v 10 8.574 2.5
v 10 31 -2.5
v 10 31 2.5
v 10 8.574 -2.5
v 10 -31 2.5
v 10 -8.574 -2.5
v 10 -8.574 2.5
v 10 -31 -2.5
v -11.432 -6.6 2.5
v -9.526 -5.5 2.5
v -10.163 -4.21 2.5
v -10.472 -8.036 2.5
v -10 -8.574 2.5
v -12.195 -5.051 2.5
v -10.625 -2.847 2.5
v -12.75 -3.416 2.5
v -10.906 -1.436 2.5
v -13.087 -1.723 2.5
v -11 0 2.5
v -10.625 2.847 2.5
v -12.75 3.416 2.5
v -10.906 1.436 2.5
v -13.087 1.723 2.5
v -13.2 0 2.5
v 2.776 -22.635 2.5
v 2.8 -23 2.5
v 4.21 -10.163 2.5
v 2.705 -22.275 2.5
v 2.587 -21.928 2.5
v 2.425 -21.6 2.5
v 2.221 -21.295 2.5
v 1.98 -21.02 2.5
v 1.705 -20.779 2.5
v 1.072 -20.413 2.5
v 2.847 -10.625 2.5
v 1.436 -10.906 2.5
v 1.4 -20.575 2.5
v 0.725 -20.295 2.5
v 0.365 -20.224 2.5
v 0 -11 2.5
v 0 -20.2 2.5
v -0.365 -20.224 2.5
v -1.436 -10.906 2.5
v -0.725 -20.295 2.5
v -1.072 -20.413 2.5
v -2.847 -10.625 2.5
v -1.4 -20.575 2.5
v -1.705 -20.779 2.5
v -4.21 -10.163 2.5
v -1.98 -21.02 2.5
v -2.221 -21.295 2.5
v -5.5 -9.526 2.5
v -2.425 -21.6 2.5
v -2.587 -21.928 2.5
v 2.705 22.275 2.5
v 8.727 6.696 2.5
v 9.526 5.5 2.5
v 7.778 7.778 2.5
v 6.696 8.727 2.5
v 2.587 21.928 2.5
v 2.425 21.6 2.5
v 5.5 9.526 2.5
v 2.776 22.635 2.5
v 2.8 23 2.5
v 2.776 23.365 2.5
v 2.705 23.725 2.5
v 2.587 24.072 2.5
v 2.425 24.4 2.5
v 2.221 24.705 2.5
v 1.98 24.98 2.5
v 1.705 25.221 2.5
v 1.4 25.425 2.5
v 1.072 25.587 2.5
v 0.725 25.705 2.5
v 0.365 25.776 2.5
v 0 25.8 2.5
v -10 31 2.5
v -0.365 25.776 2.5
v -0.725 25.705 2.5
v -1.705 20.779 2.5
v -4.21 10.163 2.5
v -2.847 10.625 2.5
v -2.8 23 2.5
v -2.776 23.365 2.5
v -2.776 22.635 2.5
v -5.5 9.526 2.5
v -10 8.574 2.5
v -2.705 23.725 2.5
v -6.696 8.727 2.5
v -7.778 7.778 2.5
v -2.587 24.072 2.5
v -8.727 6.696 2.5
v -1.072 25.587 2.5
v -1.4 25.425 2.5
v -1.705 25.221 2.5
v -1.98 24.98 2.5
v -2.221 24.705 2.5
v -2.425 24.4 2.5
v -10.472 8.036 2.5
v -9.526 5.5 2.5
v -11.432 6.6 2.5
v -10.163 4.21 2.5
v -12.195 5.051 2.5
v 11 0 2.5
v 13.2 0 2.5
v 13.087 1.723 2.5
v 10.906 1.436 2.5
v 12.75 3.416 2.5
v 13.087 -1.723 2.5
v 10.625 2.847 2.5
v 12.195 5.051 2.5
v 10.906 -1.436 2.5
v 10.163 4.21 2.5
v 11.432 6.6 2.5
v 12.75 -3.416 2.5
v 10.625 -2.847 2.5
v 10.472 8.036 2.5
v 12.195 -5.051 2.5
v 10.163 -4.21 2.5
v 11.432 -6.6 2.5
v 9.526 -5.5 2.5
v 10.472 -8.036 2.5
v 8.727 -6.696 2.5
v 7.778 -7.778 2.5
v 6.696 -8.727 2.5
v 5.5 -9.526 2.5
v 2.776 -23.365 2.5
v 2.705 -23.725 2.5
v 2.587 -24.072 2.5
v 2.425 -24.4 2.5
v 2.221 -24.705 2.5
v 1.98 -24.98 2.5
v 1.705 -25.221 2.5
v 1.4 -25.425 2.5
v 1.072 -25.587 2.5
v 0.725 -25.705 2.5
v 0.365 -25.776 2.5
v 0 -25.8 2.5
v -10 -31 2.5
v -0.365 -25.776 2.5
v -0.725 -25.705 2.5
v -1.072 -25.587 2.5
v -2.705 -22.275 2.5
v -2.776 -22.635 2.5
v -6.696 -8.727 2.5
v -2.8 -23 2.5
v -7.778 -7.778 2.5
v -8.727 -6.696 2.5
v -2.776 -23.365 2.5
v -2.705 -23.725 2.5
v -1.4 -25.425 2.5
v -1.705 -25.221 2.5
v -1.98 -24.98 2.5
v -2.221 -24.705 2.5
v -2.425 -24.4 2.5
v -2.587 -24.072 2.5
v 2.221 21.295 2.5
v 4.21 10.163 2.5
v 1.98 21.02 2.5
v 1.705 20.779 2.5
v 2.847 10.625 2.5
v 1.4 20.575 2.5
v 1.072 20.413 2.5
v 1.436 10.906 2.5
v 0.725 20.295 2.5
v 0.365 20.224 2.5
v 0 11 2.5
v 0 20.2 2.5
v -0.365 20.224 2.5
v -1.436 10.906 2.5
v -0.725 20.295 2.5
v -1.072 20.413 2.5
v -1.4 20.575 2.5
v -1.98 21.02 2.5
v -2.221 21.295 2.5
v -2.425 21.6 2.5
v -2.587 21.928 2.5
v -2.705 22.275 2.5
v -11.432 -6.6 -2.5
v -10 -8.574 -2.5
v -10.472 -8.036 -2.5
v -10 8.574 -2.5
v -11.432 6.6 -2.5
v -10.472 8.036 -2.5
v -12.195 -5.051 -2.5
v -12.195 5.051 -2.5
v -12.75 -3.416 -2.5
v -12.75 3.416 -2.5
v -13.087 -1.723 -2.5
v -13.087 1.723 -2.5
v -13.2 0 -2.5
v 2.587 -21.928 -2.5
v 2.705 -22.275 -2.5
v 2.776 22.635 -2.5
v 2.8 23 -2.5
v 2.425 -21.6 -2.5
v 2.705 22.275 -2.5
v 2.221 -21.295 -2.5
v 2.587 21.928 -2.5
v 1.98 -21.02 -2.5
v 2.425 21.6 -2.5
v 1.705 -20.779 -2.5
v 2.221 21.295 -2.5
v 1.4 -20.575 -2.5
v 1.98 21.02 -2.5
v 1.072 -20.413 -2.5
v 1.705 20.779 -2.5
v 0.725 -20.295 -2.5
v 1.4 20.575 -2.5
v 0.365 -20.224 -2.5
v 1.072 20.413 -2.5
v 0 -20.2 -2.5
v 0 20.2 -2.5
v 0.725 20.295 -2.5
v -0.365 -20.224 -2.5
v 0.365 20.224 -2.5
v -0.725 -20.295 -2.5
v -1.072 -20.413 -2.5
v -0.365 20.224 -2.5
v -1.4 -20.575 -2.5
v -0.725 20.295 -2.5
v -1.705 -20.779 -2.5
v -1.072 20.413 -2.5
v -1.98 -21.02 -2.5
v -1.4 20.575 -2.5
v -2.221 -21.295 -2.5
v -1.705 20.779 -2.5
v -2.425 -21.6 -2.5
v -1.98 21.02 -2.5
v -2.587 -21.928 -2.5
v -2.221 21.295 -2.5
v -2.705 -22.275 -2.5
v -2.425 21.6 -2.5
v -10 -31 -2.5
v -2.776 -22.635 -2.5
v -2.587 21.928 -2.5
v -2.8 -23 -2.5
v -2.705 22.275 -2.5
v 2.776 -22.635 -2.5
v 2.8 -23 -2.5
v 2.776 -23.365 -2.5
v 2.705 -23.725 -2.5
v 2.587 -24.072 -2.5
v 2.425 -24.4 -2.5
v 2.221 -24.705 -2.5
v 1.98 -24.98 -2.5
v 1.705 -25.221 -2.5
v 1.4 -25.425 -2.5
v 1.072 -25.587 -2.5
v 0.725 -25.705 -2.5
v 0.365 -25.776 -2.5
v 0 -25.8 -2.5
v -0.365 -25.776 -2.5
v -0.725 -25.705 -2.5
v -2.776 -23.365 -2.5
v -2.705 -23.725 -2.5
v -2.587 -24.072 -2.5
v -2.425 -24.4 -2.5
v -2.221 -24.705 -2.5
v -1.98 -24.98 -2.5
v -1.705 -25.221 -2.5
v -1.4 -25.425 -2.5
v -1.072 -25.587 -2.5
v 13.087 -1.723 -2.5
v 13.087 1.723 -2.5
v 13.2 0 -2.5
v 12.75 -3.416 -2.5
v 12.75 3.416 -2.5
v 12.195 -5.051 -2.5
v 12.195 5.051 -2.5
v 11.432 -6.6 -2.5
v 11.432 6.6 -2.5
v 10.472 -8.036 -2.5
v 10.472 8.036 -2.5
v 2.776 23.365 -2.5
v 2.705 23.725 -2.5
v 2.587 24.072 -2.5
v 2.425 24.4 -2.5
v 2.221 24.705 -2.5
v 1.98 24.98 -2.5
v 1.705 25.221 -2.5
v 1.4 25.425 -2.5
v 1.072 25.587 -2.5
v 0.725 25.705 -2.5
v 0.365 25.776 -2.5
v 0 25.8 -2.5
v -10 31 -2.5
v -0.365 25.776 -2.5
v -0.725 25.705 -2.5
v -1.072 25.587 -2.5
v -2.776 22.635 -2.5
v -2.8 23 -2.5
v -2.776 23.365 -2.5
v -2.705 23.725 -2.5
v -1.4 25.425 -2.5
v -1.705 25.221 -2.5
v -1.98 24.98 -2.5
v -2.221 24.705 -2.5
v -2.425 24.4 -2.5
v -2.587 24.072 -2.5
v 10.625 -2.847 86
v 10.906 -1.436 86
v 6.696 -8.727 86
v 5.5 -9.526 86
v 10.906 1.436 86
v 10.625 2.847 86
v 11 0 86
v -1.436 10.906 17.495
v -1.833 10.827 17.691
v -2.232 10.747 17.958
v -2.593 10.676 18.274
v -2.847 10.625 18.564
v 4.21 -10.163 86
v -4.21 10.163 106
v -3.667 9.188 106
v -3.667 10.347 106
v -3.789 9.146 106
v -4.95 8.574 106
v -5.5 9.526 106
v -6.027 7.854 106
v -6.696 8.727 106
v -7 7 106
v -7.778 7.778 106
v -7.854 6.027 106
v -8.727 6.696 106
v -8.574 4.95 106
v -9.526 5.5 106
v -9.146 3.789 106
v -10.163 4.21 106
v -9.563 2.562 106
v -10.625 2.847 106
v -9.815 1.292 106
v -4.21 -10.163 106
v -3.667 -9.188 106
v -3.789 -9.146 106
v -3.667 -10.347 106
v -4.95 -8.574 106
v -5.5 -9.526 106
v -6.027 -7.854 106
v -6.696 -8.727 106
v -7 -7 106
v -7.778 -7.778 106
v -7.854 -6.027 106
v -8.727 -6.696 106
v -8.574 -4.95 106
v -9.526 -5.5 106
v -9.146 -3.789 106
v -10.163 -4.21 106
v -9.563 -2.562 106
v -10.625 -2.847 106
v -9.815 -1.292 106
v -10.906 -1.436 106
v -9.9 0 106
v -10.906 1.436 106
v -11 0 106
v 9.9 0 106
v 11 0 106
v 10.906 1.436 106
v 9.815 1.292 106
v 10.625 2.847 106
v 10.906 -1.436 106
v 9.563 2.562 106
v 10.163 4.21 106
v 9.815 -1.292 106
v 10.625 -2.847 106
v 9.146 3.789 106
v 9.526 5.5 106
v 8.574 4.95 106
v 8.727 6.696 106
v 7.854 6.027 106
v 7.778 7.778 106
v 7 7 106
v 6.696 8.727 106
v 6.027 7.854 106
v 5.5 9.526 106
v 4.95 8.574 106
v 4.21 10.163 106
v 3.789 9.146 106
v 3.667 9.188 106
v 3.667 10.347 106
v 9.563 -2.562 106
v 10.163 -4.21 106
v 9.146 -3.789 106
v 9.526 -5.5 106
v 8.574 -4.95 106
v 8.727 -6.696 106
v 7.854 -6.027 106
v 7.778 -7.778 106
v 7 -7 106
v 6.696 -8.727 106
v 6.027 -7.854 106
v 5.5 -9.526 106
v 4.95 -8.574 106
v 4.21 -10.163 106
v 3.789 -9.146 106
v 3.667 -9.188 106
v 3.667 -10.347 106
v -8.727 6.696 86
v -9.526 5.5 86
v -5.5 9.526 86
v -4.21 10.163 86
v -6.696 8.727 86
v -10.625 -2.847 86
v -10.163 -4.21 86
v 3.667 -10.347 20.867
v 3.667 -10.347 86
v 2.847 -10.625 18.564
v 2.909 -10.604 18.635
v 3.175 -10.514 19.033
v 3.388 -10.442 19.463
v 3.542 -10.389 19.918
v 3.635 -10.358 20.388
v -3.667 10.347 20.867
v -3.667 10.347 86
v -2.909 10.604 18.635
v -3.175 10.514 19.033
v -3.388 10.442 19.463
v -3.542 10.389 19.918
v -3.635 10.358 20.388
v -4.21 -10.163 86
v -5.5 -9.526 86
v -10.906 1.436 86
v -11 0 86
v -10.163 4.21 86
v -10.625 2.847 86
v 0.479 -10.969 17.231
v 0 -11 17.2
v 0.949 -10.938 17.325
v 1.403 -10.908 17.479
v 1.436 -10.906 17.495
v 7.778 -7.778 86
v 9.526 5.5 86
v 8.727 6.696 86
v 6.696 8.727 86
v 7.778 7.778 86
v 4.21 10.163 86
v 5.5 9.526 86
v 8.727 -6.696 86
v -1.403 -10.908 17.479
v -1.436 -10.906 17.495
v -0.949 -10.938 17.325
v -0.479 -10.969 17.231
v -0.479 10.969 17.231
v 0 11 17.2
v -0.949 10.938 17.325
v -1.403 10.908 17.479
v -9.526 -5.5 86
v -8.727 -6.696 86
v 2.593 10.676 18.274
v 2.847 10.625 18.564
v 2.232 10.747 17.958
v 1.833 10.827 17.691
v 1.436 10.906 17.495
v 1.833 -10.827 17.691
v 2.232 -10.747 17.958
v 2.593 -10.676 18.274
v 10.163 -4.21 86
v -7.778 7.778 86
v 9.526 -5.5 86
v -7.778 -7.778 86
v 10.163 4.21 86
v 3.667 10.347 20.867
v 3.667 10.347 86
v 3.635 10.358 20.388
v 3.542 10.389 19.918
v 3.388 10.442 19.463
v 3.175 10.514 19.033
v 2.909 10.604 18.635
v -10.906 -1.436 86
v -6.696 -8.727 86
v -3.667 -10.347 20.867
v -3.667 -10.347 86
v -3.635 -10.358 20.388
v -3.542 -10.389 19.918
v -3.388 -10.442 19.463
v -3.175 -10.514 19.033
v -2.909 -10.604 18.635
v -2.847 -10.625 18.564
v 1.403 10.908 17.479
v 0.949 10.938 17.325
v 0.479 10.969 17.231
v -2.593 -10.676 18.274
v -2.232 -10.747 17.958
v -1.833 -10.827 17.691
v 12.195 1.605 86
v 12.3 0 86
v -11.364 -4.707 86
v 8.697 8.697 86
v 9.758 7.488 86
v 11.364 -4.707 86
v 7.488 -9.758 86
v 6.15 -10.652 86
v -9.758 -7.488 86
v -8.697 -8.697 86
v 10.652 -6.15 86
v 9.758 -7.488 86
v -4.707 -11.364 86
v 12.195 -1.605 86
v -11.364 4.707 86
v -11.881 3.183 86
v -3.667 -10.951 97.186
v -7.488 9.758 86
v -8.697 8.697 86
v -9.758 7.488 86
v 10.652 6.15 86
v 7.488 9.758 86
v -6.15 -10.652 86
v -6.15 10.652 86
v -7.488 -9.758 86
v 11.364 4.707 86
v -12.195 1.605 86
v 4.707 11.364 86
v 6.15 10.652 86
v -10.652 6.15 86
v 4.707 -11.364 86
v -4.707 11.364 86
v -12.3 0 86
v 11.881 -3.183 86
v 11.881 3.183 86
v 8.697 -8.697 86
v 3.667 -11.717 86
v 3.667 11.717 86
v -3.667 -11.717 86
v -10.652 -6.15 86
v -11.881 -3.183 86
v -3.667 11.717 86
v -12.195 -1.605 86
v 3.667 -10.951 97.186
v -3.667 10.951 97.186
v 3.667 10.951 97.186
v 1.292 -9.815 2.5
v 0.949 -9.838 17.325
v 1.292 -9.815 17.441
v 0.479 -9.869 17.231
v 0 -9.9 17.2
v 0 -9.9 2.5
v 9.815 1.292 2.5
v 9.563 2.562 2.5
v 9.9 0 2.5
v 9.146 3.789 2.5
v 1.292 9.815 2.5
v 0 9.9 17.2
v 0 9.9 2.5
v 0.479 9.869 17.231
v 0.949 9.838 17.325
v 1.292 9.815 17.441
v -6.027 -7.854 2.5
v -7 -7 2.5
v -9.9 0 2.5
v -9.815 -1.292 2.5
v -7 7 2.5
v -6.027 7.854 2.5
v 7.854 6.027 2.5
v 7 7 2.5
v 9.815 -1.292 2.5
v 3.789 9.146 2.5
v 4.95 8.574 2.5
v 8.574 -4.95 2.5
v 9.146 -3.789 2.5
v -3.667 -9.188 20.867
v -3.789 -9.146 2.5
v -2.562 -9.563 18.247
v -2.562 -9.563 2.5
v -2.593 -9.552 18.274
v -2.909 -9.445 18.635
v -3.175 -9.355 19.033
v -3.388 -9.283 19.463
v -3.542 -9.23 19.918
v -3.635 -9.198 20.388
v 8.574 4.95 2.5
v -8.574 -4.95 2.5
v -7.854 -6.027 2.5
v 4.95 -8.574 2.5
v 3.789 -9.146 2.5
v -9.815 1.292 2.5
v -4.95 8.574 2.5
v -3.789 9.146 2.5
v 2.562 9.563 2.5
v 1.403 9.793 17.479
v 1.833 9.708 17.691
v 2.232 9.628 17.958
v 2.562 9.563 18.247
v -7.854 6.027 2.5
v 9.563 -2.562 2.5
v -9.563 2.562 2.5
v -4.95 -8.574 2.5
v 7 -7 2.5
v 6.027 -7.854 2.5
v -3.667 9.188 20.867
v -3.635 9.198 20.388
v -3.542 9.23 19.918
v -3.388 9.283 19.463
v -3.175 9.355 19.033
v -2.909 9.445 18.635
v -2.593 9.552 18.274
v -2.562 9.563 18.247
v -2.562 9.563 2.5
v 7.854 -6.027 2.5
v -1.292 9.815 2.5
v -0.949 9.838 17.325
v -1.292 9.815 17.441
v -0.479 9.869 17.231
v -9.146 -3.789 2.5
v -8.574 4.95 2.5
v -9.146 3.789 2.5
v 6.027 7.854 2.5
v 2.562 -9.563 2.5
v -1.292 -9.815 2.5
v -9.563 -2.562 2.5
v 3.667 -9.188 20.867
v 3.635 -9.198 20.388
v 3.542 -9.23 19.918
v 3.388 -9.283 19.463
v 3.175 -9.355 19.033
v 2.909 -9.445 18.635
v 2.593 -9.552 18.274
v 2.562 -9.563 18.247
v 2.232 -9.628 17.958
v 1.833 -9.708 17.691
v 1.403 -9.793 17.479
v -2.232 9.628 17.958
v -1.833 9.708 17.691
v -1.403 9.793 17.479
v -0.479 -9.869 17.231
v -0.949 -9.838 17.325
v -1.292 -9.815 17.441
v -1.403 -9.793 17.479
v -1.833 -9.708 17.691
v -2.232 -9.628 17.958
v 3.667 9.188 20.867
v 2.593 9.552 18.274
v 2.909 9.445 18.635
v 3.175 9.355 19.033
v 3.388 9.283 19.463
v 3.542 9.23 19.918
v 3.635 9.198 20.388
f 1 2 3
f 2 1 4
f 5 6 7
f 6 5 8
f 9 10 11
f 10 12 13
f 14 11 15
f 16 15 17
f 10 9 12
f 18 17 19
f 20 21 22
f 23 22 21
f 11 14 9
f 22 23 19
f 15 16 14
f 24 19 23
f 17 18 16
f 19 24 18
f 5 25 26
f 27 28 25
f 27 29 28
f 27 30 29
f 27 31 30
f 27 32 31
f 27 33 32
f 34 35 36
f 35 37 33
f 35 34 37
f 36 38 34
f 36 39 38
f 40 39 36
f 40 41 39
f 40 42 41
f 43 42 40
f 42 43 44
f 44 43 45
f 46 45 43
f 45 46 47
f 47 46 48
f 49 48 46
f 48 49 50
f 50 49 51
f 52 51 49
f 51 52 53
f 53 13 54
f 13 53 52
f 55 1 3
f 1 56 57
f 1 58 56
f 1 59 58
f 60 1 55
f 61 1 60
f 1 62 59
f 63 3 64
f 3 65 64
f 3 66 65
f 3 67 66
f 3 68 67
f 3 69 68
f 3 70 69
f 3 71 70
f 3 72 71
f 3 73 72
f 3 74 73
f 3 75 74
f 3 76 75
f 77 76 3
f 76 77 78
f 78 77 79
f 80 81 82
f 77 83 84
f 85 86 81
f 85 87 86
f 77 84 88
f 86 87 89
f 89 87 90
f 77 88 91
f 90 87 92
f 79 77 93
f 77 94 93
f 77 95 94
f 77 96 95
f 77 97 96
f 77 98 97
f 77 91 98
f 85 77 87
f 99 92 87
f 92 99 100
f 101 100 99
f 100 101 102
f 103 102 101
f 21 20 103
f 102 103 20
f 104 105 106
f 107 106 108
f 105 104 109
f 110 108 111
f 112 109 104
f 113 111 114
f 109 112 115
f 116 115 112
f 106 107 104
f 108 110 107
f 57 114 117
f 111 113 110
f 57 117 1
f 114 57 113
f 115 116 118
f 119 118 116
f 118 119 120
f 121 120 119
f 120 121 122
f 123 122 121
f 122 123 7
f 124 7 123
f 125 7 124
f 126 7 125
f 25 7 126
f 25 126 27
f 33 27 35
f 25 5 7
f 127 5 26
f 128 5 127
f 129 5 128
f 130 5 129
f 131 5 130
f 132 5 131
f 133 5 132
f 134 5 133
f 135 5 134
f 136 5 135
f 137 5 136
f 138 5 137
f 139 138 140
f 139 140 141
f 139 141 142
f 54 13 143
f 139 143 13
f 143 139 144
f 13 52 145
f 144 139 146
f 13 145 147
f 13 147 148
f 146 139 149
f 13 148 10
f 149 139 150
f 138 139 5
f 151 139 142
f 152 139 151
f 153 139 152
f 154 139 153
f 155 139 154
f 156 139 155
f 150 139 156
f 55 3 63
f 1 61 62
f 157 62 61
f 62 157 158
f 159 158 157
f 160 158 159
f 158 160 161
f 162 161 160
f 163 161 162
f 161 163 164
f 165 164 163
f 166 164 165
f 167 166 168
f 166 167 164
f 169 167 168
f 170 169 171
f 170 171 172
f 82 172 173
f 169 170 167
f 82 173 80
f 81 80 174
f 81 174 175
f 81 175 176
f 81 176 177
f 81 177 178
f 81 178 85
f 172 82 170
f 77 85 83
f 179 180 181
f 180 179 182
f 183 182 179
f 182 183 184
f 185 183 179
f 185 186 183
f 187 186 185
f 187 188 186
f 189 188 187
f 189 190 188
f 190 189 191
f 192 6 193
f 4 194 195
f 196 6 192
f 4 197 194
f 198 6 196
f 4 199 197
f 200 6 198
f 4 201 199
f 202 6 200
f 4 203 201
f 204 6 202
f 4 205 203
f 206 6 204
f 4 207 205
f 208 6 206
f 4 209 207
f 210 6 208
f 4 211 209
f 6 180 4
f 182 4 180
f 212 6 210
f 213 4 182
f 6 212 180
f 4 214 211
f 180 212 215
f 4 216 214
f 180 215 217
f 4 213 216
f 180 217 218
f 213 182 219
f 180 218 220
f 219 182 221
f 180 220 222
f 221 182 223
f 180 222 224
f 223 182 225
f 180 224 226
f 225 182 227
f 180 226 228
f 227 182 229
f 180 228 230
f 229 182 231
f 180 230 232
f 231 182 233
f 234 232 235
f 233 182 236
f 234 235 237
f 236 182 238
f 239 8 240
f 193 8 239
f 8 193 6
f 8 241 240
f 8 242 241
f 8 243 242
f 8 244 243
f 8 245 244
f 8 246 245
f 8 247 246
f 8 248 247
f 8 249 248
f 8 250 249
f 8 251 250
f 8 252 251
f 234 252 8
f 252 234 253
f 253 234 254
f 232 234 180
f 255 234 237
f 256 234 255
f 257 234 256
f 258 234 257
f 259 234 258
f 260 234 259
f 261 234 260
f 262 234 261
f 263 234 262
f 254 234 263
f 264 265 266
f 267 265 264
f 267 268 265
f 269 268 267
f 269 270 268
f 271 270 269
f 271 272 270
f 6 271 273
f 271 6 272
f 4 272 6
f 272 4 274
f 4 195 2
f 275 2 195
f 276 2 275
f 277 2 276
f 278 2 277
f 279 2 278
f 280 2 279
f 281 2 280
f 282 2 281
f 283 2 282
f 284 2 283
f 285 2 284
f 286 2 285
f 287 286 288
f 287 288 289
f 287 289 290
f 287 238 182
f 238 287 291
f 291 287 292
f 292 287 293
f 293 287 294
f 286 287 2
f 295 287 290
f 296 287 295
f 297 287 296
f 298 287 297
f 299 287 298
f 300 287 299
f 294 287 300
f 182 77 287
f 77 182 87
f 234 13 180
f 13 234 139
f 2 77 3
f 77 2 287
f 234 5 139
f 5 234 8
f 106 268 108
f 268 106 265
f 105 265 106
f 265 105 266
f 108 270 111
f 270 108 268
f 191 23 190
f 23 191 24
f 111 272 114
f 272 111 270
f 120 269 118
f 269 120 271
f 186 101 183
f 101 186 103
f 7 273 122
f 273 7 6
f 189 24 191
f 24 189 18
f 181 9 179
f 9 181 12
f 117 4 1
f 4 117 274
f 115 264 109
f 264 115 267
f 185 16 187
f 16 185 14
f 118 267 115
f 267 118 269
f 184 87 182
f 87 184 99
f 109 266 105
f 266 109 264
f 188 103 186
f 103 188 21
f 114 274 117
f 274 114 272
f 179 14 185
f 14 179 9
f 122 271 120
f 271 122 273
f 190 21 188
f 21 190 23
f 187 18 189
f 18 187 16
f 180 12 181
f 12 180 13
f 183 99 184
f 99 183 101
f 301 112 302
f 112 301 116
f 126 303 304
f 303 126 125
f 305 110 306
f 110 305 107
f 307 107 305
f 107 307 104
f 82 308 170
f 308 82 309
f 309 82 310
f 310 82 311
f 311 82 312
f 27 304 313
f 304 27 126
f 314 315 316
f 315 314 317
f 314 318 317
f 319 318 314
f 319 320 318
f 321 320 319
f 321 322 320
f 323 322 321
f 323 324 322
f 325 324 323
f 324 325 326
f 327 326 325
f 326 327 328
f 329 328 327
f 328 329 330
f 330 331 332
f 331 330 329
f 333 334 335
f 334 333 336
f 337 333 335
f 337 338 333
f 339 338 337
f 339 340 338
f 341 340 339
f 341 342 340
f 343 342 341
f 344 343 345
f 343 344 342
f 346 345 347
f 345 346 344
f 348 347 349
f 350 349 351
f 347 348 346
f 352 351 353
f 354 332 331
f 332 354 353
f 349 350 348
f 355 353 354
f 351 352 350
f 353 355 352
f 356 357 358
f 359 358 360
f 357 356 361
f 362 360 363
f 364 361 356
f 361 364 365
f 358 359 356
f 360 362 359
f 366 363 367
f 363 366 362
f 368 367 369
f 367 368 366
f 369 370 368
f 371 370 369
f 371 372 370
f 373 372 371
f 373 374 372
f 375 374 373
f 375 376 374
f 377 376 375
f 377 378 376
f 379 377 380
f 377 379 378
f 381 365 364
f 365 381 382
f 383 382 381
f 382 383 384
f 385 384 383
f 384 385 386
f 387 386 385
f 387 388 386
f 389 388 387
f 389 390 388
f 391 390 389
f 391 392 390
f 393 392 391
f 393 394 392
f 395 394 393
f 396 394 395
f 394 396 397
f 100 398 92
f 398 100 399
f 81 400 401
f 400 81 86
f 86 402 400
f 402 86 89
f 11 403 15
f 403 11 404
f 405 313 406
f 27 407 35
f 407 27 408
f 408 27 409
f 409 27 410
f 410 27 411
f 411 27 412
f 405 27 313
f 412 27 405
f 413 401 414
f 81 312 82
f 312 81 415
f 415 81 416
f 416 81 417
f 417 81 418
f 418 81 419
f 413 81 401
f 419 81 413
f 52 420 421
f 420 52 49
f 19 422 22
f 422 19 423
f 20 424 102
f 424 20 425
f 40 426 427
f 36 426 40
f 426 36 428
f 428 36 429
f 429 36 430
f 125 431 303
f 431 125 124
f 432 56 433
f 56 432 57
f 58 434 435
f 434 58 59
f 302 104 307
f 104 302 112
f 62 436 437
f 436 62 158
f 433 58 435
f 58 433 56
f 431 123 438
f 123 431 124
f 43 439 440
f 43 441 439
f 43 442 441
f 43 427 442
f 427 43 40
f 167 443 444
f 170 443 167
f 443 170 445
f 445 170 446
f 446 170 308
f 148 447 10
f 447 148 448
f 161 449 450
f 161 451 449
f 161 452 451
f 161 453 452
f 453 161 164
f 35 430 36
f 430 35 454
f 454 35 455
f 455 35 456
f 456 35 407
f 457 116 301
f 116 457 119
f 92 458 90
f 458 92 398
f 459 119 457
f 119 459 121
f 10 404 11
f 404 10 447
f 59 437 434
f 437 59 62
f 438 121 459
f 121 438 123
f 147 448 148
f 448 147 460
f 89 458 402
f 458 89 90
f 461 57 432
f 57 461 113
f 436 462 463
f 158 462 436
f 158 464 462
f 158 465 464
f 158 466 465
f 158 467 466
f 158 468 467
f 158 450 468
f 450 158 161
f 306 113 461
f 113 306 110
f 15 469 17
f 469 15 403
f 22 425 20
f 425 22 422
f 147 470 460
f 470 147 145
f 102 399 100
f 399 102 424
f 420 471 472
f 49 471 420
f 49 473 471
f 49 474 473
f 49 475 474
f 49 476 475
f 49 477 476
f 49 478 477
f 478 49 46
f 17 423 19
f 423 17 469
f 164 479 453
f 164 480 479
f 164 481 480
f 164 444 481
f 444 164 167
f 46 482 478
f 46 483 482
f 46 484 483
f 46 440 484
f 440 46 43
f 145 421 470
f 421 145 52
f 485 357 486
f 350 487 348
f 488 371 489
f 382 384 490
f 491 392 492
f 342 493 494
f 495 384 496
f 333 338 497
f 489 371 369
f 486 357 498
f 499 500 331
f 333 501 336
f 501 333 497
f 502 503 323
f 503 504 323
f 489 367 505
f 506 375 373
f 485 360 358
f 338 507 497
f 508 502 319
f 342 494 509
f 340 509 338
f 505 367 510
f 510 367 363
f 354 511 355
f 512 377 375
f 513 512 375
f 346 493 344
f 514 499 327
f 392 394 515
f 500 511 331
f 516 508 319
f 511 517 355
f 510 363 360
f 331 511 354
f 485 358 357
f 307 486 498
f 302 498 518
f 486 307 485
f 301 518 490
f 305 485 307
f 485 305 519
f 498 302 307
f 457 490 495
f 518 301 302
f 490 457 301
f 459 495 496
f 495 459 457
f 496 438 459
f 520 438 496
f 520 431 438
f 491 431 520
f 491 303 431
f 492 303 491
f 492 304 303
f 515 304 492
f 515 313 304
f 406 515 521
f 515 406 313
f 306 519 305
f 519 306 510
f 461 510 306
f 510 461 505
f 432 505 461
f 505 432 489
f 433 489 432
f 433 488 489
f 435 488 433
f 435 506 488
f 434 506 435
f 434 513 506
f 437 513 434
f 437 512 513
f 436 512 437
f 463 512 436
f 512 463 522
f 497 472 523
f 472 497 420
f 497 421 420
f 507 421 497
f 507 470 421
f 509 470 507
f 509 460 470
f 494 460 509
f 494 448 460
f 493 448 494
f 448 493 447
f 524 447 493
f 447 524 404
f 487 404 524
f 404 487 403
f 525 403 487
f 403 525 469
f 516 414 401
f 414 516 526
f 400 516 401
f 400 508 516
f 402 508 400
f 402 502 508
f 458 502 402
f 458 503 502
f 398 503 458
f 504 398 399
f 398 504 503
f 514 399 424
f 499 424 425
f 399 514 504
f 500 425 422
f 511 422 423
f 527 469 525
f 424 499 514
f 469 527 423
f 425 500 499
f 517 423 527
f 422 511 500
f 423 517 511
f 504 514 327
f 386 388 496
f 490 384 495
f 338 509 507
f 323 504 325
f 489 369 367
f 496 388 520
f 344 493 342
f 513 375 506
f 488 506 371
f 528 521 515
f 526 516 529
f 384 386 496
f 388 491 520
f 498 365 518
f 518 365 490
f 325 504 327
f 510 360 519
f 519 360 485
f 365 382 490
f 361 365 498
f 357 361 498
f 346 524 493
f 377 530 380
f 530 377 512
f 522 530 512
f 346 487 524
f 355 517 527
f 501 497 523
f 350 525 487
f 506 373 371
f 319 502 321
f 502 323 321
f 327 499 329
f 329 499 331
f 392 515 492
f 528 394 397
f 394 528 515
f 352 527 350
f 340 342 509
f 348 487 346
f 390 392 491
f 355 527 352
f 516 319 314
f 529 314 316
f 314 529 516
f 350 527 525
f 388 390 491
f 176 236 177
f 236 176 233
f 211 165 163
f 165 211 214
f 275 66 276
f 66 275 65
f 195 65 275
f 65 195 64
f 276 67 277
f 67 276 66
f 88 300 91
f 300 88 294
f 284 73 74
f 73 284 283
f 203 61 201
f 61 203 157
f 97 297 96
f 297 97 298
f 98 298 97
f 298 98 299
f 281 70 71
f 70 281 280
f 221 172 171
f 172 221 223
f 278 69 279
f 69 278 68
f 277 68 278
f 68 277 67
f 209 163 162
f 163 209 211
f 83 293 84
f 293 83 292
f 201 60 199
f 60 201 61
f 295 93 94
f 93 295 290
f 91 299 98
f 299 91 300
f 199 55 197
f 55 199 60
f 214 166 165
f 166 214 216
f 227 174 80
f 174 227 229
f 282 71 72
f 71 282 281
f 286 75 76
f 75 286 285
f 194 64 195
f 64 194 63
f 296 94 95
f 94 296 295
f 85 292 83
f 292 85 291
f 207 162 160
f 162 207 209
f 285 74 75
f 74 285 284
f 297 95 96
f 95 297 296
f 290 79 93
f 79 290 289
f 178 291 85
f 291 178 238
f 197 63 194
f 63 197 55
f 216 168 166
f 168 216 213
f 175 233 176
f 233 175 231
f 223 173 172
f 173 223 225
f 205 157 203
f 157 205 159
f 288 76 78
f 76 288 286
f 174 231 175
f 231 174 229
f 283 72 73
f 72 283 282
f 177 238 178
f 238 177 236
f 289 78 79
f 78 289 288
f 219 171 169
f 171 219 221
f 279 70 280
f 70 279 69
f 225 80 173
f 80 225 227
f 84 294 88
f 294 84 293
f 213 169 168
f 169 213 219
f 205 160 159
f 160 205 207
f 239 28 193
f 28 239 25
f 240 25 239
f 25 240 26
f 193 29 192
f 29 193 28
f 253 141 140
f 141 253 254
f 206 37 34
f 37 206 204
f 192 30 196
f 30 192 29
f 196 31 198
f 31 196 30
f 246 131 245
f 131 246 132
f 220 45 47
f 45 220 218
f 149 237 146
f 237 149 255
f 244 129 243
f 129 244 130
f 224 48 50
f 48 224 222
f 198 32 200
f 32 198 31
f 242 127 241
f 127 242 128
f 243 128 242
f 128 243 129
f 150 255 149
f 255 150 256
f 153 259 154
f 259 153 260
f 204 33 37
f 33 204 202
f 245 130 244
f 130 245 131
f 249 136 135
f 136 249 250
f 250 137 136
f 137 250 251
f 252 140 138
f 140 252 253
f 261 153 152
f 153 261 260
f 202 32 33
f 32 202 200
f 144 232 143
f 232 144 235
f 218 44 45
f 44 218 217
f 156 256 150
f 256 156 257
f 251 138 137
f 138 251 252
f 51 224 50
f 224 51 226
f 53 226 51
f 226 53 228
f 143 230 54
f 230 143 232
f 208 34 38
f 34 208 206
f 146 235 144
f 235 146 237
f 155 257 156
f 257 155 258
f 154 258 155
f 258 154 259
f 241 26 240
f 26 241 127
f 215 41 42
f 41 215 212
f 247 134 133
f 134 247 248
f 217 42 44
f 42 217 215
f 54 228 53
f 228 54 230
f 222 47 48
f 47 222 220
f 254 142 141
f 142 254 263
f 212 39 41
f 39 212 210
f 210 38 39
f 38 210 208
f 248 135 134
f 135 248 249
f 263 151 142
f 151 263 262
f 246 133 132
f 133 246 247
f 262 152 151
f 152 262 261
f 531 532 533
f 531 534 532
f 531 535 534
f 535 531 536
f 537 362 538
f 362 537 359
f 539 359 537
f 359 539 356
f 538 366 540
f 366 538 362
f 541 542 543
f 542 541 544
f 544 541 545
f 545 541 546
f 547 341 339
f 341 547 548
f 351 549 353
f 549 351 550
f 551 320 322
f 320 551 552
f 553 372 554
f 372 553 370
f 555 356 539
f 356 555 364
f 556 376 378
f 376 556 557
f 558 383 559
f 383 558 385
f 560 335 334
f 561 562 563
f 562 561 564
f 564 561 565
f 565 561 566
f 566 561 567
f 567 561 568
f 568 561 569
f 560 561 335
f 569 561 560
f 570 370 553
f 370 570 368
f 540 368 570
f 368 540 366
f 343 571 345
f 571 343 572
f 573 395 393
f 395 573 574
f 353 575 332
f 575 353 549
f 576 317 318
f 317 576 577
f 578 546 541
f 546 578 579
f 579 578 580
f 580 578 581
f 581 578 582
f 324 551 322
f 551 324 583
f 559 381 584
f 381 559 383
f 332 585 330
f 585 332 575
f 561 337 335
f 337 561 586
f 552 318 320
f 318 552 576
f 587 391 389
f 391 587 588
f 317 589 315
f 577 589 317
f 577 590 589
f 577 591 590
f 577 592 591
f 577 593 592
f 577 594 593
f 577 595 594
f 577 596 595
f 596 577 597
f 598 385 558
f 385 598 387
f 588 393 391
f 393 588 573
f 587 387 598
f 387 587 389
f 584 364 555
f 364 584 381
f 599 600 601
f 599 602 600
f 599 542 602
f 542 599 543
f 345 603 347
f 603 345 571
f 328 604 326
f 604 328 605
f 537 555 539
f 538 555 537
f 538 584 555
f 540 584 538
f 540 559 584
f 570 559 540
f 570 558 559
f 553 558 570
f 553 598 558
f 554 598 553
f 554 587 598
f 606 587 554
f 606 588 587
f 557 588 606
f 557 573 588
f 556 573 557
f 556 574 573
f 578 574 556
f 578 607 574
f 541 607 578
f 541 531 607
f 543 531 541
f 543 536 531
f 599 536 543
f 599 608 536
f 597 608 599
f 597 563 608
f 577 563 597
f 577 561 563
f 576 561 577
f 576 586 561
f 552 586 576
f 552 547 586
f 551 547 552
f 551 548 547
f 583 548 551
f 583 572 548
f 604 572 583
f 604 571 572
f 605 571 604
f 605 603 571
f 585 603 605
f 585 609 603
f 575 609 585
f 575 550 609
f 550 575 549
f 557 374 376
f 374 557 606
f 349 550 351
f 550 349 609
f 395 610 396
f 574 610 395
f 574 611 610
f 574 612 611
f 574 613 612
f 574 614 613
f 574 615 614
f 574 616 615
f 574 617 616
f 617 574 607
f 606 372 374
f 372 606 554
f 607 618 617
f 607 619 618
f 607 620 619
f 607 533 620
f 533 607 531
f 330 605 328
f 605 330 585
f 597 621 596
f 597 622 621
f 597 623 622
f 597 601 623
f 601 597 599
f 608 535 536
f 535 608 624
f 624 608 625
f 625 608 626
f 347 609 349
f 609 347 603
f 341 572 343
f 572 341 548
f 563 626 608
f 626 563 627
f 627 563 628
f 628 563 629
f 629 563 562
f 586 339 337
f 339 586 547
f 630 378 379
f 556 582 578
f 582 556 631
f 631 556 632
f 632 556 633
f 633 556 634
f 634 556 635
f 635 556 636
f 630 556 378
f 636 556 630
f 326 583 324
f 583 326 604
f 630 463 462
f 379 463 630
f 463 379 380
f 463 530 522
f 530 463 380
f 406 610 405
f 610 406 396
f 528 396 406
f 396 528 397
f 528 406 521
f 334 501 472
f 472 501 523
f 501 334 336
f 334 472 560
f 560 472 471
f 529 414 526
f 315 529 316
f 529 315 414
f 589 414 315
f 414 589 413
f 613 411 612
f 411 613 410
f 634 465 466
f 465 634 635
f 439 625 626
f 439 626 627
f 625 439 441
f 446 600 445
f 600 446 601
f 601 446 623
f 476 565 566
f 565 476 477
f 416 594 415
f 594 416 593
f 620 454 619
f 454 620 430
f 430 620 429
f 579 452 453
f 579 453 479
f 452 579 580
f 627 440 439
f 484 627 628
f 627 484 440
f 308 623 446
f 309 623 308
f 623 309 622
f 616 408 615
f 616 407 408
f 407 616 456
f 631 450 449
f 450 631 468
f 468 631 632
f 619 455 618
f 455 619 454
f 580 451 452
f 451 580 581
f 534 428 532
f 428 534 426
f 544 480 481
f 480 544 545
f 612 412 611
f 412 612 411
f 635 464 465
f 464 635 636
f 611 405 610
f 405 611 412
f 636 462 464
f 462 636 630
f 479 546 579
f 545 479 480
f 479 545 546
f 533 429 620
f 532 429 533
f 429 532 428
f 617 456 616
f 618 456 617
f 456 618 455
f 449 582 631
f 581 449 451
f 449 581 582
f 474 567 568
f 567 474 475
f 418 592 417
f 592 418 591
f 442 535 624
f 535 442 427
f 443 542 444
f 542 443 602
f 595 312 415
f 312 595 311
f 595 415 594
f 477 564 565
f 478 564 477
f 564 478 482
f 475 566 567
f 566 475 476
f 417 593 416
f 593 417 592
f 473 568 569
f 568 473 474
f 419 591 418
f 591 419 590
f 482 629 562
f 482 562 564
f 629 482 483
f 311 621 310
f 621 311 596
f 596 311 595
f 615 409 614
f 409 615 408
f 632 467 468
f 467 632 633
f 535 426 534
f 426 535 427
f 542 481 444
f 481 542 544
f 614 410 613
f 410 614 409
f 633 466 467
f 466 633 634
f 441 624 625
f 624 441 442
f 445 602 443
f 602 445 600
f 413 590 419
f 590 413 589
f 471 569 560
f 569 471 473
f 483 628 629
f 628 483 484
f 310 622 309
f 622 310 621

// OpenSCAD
//custermizing data

//Takuya Yamaguchi 2014/5/25
//Takuya Yamaguchi 2015/1/31

//Core Diameter
CD=22; //[15:100]

//Reel Width
RW=86; //[20:120]

difference(){
union(){
cube([20,CD+40,5],center=true); // Screw Braket
translate([0,0,0])rotate([0,0,0])
cylinder(h=5, r=CD/2+CD*0.1,$fn=48,center=true); // Base Fringe
translate([0,0,(RW+20)/2])
cylinder(h=RW+20, r=CD/2,$fn=48,center=true); //main cylinder
translate([0,0,RW+10])
cylinder(h=20, r2=CD/2,r1=CD/2+1.3,$fn=48,center=true); //taper
}
translate([0,CD/2+12,0])rotate([0,0,0])
#cylinder(h=20, r=2.8,$fn=48,center=true); //screw hole
translate([0,-(CD/2+12),0])rotate([0,0,0])
#cylinder(h=20, r=2.8,$fn=48,center=true); // screw hole
translate([0,0,(RW+20)/2+5])
cylinder(h=RW+25, r=CD/2-CD*0.05,$fn=48,center=true); //inner clinder
translate([0,0,RW*0.2+(RW+20)/2+CD/6])rotate([0,0,0])
#cube([CD/3,CD+10,RW+20],center=true); //Slit 
translate([0,0,RW*0.2+CD/6])rotate([90,0,0])
#cylinder(h=RW+1, r=CD/6,$fn=48,center=true); //Slit R
}
